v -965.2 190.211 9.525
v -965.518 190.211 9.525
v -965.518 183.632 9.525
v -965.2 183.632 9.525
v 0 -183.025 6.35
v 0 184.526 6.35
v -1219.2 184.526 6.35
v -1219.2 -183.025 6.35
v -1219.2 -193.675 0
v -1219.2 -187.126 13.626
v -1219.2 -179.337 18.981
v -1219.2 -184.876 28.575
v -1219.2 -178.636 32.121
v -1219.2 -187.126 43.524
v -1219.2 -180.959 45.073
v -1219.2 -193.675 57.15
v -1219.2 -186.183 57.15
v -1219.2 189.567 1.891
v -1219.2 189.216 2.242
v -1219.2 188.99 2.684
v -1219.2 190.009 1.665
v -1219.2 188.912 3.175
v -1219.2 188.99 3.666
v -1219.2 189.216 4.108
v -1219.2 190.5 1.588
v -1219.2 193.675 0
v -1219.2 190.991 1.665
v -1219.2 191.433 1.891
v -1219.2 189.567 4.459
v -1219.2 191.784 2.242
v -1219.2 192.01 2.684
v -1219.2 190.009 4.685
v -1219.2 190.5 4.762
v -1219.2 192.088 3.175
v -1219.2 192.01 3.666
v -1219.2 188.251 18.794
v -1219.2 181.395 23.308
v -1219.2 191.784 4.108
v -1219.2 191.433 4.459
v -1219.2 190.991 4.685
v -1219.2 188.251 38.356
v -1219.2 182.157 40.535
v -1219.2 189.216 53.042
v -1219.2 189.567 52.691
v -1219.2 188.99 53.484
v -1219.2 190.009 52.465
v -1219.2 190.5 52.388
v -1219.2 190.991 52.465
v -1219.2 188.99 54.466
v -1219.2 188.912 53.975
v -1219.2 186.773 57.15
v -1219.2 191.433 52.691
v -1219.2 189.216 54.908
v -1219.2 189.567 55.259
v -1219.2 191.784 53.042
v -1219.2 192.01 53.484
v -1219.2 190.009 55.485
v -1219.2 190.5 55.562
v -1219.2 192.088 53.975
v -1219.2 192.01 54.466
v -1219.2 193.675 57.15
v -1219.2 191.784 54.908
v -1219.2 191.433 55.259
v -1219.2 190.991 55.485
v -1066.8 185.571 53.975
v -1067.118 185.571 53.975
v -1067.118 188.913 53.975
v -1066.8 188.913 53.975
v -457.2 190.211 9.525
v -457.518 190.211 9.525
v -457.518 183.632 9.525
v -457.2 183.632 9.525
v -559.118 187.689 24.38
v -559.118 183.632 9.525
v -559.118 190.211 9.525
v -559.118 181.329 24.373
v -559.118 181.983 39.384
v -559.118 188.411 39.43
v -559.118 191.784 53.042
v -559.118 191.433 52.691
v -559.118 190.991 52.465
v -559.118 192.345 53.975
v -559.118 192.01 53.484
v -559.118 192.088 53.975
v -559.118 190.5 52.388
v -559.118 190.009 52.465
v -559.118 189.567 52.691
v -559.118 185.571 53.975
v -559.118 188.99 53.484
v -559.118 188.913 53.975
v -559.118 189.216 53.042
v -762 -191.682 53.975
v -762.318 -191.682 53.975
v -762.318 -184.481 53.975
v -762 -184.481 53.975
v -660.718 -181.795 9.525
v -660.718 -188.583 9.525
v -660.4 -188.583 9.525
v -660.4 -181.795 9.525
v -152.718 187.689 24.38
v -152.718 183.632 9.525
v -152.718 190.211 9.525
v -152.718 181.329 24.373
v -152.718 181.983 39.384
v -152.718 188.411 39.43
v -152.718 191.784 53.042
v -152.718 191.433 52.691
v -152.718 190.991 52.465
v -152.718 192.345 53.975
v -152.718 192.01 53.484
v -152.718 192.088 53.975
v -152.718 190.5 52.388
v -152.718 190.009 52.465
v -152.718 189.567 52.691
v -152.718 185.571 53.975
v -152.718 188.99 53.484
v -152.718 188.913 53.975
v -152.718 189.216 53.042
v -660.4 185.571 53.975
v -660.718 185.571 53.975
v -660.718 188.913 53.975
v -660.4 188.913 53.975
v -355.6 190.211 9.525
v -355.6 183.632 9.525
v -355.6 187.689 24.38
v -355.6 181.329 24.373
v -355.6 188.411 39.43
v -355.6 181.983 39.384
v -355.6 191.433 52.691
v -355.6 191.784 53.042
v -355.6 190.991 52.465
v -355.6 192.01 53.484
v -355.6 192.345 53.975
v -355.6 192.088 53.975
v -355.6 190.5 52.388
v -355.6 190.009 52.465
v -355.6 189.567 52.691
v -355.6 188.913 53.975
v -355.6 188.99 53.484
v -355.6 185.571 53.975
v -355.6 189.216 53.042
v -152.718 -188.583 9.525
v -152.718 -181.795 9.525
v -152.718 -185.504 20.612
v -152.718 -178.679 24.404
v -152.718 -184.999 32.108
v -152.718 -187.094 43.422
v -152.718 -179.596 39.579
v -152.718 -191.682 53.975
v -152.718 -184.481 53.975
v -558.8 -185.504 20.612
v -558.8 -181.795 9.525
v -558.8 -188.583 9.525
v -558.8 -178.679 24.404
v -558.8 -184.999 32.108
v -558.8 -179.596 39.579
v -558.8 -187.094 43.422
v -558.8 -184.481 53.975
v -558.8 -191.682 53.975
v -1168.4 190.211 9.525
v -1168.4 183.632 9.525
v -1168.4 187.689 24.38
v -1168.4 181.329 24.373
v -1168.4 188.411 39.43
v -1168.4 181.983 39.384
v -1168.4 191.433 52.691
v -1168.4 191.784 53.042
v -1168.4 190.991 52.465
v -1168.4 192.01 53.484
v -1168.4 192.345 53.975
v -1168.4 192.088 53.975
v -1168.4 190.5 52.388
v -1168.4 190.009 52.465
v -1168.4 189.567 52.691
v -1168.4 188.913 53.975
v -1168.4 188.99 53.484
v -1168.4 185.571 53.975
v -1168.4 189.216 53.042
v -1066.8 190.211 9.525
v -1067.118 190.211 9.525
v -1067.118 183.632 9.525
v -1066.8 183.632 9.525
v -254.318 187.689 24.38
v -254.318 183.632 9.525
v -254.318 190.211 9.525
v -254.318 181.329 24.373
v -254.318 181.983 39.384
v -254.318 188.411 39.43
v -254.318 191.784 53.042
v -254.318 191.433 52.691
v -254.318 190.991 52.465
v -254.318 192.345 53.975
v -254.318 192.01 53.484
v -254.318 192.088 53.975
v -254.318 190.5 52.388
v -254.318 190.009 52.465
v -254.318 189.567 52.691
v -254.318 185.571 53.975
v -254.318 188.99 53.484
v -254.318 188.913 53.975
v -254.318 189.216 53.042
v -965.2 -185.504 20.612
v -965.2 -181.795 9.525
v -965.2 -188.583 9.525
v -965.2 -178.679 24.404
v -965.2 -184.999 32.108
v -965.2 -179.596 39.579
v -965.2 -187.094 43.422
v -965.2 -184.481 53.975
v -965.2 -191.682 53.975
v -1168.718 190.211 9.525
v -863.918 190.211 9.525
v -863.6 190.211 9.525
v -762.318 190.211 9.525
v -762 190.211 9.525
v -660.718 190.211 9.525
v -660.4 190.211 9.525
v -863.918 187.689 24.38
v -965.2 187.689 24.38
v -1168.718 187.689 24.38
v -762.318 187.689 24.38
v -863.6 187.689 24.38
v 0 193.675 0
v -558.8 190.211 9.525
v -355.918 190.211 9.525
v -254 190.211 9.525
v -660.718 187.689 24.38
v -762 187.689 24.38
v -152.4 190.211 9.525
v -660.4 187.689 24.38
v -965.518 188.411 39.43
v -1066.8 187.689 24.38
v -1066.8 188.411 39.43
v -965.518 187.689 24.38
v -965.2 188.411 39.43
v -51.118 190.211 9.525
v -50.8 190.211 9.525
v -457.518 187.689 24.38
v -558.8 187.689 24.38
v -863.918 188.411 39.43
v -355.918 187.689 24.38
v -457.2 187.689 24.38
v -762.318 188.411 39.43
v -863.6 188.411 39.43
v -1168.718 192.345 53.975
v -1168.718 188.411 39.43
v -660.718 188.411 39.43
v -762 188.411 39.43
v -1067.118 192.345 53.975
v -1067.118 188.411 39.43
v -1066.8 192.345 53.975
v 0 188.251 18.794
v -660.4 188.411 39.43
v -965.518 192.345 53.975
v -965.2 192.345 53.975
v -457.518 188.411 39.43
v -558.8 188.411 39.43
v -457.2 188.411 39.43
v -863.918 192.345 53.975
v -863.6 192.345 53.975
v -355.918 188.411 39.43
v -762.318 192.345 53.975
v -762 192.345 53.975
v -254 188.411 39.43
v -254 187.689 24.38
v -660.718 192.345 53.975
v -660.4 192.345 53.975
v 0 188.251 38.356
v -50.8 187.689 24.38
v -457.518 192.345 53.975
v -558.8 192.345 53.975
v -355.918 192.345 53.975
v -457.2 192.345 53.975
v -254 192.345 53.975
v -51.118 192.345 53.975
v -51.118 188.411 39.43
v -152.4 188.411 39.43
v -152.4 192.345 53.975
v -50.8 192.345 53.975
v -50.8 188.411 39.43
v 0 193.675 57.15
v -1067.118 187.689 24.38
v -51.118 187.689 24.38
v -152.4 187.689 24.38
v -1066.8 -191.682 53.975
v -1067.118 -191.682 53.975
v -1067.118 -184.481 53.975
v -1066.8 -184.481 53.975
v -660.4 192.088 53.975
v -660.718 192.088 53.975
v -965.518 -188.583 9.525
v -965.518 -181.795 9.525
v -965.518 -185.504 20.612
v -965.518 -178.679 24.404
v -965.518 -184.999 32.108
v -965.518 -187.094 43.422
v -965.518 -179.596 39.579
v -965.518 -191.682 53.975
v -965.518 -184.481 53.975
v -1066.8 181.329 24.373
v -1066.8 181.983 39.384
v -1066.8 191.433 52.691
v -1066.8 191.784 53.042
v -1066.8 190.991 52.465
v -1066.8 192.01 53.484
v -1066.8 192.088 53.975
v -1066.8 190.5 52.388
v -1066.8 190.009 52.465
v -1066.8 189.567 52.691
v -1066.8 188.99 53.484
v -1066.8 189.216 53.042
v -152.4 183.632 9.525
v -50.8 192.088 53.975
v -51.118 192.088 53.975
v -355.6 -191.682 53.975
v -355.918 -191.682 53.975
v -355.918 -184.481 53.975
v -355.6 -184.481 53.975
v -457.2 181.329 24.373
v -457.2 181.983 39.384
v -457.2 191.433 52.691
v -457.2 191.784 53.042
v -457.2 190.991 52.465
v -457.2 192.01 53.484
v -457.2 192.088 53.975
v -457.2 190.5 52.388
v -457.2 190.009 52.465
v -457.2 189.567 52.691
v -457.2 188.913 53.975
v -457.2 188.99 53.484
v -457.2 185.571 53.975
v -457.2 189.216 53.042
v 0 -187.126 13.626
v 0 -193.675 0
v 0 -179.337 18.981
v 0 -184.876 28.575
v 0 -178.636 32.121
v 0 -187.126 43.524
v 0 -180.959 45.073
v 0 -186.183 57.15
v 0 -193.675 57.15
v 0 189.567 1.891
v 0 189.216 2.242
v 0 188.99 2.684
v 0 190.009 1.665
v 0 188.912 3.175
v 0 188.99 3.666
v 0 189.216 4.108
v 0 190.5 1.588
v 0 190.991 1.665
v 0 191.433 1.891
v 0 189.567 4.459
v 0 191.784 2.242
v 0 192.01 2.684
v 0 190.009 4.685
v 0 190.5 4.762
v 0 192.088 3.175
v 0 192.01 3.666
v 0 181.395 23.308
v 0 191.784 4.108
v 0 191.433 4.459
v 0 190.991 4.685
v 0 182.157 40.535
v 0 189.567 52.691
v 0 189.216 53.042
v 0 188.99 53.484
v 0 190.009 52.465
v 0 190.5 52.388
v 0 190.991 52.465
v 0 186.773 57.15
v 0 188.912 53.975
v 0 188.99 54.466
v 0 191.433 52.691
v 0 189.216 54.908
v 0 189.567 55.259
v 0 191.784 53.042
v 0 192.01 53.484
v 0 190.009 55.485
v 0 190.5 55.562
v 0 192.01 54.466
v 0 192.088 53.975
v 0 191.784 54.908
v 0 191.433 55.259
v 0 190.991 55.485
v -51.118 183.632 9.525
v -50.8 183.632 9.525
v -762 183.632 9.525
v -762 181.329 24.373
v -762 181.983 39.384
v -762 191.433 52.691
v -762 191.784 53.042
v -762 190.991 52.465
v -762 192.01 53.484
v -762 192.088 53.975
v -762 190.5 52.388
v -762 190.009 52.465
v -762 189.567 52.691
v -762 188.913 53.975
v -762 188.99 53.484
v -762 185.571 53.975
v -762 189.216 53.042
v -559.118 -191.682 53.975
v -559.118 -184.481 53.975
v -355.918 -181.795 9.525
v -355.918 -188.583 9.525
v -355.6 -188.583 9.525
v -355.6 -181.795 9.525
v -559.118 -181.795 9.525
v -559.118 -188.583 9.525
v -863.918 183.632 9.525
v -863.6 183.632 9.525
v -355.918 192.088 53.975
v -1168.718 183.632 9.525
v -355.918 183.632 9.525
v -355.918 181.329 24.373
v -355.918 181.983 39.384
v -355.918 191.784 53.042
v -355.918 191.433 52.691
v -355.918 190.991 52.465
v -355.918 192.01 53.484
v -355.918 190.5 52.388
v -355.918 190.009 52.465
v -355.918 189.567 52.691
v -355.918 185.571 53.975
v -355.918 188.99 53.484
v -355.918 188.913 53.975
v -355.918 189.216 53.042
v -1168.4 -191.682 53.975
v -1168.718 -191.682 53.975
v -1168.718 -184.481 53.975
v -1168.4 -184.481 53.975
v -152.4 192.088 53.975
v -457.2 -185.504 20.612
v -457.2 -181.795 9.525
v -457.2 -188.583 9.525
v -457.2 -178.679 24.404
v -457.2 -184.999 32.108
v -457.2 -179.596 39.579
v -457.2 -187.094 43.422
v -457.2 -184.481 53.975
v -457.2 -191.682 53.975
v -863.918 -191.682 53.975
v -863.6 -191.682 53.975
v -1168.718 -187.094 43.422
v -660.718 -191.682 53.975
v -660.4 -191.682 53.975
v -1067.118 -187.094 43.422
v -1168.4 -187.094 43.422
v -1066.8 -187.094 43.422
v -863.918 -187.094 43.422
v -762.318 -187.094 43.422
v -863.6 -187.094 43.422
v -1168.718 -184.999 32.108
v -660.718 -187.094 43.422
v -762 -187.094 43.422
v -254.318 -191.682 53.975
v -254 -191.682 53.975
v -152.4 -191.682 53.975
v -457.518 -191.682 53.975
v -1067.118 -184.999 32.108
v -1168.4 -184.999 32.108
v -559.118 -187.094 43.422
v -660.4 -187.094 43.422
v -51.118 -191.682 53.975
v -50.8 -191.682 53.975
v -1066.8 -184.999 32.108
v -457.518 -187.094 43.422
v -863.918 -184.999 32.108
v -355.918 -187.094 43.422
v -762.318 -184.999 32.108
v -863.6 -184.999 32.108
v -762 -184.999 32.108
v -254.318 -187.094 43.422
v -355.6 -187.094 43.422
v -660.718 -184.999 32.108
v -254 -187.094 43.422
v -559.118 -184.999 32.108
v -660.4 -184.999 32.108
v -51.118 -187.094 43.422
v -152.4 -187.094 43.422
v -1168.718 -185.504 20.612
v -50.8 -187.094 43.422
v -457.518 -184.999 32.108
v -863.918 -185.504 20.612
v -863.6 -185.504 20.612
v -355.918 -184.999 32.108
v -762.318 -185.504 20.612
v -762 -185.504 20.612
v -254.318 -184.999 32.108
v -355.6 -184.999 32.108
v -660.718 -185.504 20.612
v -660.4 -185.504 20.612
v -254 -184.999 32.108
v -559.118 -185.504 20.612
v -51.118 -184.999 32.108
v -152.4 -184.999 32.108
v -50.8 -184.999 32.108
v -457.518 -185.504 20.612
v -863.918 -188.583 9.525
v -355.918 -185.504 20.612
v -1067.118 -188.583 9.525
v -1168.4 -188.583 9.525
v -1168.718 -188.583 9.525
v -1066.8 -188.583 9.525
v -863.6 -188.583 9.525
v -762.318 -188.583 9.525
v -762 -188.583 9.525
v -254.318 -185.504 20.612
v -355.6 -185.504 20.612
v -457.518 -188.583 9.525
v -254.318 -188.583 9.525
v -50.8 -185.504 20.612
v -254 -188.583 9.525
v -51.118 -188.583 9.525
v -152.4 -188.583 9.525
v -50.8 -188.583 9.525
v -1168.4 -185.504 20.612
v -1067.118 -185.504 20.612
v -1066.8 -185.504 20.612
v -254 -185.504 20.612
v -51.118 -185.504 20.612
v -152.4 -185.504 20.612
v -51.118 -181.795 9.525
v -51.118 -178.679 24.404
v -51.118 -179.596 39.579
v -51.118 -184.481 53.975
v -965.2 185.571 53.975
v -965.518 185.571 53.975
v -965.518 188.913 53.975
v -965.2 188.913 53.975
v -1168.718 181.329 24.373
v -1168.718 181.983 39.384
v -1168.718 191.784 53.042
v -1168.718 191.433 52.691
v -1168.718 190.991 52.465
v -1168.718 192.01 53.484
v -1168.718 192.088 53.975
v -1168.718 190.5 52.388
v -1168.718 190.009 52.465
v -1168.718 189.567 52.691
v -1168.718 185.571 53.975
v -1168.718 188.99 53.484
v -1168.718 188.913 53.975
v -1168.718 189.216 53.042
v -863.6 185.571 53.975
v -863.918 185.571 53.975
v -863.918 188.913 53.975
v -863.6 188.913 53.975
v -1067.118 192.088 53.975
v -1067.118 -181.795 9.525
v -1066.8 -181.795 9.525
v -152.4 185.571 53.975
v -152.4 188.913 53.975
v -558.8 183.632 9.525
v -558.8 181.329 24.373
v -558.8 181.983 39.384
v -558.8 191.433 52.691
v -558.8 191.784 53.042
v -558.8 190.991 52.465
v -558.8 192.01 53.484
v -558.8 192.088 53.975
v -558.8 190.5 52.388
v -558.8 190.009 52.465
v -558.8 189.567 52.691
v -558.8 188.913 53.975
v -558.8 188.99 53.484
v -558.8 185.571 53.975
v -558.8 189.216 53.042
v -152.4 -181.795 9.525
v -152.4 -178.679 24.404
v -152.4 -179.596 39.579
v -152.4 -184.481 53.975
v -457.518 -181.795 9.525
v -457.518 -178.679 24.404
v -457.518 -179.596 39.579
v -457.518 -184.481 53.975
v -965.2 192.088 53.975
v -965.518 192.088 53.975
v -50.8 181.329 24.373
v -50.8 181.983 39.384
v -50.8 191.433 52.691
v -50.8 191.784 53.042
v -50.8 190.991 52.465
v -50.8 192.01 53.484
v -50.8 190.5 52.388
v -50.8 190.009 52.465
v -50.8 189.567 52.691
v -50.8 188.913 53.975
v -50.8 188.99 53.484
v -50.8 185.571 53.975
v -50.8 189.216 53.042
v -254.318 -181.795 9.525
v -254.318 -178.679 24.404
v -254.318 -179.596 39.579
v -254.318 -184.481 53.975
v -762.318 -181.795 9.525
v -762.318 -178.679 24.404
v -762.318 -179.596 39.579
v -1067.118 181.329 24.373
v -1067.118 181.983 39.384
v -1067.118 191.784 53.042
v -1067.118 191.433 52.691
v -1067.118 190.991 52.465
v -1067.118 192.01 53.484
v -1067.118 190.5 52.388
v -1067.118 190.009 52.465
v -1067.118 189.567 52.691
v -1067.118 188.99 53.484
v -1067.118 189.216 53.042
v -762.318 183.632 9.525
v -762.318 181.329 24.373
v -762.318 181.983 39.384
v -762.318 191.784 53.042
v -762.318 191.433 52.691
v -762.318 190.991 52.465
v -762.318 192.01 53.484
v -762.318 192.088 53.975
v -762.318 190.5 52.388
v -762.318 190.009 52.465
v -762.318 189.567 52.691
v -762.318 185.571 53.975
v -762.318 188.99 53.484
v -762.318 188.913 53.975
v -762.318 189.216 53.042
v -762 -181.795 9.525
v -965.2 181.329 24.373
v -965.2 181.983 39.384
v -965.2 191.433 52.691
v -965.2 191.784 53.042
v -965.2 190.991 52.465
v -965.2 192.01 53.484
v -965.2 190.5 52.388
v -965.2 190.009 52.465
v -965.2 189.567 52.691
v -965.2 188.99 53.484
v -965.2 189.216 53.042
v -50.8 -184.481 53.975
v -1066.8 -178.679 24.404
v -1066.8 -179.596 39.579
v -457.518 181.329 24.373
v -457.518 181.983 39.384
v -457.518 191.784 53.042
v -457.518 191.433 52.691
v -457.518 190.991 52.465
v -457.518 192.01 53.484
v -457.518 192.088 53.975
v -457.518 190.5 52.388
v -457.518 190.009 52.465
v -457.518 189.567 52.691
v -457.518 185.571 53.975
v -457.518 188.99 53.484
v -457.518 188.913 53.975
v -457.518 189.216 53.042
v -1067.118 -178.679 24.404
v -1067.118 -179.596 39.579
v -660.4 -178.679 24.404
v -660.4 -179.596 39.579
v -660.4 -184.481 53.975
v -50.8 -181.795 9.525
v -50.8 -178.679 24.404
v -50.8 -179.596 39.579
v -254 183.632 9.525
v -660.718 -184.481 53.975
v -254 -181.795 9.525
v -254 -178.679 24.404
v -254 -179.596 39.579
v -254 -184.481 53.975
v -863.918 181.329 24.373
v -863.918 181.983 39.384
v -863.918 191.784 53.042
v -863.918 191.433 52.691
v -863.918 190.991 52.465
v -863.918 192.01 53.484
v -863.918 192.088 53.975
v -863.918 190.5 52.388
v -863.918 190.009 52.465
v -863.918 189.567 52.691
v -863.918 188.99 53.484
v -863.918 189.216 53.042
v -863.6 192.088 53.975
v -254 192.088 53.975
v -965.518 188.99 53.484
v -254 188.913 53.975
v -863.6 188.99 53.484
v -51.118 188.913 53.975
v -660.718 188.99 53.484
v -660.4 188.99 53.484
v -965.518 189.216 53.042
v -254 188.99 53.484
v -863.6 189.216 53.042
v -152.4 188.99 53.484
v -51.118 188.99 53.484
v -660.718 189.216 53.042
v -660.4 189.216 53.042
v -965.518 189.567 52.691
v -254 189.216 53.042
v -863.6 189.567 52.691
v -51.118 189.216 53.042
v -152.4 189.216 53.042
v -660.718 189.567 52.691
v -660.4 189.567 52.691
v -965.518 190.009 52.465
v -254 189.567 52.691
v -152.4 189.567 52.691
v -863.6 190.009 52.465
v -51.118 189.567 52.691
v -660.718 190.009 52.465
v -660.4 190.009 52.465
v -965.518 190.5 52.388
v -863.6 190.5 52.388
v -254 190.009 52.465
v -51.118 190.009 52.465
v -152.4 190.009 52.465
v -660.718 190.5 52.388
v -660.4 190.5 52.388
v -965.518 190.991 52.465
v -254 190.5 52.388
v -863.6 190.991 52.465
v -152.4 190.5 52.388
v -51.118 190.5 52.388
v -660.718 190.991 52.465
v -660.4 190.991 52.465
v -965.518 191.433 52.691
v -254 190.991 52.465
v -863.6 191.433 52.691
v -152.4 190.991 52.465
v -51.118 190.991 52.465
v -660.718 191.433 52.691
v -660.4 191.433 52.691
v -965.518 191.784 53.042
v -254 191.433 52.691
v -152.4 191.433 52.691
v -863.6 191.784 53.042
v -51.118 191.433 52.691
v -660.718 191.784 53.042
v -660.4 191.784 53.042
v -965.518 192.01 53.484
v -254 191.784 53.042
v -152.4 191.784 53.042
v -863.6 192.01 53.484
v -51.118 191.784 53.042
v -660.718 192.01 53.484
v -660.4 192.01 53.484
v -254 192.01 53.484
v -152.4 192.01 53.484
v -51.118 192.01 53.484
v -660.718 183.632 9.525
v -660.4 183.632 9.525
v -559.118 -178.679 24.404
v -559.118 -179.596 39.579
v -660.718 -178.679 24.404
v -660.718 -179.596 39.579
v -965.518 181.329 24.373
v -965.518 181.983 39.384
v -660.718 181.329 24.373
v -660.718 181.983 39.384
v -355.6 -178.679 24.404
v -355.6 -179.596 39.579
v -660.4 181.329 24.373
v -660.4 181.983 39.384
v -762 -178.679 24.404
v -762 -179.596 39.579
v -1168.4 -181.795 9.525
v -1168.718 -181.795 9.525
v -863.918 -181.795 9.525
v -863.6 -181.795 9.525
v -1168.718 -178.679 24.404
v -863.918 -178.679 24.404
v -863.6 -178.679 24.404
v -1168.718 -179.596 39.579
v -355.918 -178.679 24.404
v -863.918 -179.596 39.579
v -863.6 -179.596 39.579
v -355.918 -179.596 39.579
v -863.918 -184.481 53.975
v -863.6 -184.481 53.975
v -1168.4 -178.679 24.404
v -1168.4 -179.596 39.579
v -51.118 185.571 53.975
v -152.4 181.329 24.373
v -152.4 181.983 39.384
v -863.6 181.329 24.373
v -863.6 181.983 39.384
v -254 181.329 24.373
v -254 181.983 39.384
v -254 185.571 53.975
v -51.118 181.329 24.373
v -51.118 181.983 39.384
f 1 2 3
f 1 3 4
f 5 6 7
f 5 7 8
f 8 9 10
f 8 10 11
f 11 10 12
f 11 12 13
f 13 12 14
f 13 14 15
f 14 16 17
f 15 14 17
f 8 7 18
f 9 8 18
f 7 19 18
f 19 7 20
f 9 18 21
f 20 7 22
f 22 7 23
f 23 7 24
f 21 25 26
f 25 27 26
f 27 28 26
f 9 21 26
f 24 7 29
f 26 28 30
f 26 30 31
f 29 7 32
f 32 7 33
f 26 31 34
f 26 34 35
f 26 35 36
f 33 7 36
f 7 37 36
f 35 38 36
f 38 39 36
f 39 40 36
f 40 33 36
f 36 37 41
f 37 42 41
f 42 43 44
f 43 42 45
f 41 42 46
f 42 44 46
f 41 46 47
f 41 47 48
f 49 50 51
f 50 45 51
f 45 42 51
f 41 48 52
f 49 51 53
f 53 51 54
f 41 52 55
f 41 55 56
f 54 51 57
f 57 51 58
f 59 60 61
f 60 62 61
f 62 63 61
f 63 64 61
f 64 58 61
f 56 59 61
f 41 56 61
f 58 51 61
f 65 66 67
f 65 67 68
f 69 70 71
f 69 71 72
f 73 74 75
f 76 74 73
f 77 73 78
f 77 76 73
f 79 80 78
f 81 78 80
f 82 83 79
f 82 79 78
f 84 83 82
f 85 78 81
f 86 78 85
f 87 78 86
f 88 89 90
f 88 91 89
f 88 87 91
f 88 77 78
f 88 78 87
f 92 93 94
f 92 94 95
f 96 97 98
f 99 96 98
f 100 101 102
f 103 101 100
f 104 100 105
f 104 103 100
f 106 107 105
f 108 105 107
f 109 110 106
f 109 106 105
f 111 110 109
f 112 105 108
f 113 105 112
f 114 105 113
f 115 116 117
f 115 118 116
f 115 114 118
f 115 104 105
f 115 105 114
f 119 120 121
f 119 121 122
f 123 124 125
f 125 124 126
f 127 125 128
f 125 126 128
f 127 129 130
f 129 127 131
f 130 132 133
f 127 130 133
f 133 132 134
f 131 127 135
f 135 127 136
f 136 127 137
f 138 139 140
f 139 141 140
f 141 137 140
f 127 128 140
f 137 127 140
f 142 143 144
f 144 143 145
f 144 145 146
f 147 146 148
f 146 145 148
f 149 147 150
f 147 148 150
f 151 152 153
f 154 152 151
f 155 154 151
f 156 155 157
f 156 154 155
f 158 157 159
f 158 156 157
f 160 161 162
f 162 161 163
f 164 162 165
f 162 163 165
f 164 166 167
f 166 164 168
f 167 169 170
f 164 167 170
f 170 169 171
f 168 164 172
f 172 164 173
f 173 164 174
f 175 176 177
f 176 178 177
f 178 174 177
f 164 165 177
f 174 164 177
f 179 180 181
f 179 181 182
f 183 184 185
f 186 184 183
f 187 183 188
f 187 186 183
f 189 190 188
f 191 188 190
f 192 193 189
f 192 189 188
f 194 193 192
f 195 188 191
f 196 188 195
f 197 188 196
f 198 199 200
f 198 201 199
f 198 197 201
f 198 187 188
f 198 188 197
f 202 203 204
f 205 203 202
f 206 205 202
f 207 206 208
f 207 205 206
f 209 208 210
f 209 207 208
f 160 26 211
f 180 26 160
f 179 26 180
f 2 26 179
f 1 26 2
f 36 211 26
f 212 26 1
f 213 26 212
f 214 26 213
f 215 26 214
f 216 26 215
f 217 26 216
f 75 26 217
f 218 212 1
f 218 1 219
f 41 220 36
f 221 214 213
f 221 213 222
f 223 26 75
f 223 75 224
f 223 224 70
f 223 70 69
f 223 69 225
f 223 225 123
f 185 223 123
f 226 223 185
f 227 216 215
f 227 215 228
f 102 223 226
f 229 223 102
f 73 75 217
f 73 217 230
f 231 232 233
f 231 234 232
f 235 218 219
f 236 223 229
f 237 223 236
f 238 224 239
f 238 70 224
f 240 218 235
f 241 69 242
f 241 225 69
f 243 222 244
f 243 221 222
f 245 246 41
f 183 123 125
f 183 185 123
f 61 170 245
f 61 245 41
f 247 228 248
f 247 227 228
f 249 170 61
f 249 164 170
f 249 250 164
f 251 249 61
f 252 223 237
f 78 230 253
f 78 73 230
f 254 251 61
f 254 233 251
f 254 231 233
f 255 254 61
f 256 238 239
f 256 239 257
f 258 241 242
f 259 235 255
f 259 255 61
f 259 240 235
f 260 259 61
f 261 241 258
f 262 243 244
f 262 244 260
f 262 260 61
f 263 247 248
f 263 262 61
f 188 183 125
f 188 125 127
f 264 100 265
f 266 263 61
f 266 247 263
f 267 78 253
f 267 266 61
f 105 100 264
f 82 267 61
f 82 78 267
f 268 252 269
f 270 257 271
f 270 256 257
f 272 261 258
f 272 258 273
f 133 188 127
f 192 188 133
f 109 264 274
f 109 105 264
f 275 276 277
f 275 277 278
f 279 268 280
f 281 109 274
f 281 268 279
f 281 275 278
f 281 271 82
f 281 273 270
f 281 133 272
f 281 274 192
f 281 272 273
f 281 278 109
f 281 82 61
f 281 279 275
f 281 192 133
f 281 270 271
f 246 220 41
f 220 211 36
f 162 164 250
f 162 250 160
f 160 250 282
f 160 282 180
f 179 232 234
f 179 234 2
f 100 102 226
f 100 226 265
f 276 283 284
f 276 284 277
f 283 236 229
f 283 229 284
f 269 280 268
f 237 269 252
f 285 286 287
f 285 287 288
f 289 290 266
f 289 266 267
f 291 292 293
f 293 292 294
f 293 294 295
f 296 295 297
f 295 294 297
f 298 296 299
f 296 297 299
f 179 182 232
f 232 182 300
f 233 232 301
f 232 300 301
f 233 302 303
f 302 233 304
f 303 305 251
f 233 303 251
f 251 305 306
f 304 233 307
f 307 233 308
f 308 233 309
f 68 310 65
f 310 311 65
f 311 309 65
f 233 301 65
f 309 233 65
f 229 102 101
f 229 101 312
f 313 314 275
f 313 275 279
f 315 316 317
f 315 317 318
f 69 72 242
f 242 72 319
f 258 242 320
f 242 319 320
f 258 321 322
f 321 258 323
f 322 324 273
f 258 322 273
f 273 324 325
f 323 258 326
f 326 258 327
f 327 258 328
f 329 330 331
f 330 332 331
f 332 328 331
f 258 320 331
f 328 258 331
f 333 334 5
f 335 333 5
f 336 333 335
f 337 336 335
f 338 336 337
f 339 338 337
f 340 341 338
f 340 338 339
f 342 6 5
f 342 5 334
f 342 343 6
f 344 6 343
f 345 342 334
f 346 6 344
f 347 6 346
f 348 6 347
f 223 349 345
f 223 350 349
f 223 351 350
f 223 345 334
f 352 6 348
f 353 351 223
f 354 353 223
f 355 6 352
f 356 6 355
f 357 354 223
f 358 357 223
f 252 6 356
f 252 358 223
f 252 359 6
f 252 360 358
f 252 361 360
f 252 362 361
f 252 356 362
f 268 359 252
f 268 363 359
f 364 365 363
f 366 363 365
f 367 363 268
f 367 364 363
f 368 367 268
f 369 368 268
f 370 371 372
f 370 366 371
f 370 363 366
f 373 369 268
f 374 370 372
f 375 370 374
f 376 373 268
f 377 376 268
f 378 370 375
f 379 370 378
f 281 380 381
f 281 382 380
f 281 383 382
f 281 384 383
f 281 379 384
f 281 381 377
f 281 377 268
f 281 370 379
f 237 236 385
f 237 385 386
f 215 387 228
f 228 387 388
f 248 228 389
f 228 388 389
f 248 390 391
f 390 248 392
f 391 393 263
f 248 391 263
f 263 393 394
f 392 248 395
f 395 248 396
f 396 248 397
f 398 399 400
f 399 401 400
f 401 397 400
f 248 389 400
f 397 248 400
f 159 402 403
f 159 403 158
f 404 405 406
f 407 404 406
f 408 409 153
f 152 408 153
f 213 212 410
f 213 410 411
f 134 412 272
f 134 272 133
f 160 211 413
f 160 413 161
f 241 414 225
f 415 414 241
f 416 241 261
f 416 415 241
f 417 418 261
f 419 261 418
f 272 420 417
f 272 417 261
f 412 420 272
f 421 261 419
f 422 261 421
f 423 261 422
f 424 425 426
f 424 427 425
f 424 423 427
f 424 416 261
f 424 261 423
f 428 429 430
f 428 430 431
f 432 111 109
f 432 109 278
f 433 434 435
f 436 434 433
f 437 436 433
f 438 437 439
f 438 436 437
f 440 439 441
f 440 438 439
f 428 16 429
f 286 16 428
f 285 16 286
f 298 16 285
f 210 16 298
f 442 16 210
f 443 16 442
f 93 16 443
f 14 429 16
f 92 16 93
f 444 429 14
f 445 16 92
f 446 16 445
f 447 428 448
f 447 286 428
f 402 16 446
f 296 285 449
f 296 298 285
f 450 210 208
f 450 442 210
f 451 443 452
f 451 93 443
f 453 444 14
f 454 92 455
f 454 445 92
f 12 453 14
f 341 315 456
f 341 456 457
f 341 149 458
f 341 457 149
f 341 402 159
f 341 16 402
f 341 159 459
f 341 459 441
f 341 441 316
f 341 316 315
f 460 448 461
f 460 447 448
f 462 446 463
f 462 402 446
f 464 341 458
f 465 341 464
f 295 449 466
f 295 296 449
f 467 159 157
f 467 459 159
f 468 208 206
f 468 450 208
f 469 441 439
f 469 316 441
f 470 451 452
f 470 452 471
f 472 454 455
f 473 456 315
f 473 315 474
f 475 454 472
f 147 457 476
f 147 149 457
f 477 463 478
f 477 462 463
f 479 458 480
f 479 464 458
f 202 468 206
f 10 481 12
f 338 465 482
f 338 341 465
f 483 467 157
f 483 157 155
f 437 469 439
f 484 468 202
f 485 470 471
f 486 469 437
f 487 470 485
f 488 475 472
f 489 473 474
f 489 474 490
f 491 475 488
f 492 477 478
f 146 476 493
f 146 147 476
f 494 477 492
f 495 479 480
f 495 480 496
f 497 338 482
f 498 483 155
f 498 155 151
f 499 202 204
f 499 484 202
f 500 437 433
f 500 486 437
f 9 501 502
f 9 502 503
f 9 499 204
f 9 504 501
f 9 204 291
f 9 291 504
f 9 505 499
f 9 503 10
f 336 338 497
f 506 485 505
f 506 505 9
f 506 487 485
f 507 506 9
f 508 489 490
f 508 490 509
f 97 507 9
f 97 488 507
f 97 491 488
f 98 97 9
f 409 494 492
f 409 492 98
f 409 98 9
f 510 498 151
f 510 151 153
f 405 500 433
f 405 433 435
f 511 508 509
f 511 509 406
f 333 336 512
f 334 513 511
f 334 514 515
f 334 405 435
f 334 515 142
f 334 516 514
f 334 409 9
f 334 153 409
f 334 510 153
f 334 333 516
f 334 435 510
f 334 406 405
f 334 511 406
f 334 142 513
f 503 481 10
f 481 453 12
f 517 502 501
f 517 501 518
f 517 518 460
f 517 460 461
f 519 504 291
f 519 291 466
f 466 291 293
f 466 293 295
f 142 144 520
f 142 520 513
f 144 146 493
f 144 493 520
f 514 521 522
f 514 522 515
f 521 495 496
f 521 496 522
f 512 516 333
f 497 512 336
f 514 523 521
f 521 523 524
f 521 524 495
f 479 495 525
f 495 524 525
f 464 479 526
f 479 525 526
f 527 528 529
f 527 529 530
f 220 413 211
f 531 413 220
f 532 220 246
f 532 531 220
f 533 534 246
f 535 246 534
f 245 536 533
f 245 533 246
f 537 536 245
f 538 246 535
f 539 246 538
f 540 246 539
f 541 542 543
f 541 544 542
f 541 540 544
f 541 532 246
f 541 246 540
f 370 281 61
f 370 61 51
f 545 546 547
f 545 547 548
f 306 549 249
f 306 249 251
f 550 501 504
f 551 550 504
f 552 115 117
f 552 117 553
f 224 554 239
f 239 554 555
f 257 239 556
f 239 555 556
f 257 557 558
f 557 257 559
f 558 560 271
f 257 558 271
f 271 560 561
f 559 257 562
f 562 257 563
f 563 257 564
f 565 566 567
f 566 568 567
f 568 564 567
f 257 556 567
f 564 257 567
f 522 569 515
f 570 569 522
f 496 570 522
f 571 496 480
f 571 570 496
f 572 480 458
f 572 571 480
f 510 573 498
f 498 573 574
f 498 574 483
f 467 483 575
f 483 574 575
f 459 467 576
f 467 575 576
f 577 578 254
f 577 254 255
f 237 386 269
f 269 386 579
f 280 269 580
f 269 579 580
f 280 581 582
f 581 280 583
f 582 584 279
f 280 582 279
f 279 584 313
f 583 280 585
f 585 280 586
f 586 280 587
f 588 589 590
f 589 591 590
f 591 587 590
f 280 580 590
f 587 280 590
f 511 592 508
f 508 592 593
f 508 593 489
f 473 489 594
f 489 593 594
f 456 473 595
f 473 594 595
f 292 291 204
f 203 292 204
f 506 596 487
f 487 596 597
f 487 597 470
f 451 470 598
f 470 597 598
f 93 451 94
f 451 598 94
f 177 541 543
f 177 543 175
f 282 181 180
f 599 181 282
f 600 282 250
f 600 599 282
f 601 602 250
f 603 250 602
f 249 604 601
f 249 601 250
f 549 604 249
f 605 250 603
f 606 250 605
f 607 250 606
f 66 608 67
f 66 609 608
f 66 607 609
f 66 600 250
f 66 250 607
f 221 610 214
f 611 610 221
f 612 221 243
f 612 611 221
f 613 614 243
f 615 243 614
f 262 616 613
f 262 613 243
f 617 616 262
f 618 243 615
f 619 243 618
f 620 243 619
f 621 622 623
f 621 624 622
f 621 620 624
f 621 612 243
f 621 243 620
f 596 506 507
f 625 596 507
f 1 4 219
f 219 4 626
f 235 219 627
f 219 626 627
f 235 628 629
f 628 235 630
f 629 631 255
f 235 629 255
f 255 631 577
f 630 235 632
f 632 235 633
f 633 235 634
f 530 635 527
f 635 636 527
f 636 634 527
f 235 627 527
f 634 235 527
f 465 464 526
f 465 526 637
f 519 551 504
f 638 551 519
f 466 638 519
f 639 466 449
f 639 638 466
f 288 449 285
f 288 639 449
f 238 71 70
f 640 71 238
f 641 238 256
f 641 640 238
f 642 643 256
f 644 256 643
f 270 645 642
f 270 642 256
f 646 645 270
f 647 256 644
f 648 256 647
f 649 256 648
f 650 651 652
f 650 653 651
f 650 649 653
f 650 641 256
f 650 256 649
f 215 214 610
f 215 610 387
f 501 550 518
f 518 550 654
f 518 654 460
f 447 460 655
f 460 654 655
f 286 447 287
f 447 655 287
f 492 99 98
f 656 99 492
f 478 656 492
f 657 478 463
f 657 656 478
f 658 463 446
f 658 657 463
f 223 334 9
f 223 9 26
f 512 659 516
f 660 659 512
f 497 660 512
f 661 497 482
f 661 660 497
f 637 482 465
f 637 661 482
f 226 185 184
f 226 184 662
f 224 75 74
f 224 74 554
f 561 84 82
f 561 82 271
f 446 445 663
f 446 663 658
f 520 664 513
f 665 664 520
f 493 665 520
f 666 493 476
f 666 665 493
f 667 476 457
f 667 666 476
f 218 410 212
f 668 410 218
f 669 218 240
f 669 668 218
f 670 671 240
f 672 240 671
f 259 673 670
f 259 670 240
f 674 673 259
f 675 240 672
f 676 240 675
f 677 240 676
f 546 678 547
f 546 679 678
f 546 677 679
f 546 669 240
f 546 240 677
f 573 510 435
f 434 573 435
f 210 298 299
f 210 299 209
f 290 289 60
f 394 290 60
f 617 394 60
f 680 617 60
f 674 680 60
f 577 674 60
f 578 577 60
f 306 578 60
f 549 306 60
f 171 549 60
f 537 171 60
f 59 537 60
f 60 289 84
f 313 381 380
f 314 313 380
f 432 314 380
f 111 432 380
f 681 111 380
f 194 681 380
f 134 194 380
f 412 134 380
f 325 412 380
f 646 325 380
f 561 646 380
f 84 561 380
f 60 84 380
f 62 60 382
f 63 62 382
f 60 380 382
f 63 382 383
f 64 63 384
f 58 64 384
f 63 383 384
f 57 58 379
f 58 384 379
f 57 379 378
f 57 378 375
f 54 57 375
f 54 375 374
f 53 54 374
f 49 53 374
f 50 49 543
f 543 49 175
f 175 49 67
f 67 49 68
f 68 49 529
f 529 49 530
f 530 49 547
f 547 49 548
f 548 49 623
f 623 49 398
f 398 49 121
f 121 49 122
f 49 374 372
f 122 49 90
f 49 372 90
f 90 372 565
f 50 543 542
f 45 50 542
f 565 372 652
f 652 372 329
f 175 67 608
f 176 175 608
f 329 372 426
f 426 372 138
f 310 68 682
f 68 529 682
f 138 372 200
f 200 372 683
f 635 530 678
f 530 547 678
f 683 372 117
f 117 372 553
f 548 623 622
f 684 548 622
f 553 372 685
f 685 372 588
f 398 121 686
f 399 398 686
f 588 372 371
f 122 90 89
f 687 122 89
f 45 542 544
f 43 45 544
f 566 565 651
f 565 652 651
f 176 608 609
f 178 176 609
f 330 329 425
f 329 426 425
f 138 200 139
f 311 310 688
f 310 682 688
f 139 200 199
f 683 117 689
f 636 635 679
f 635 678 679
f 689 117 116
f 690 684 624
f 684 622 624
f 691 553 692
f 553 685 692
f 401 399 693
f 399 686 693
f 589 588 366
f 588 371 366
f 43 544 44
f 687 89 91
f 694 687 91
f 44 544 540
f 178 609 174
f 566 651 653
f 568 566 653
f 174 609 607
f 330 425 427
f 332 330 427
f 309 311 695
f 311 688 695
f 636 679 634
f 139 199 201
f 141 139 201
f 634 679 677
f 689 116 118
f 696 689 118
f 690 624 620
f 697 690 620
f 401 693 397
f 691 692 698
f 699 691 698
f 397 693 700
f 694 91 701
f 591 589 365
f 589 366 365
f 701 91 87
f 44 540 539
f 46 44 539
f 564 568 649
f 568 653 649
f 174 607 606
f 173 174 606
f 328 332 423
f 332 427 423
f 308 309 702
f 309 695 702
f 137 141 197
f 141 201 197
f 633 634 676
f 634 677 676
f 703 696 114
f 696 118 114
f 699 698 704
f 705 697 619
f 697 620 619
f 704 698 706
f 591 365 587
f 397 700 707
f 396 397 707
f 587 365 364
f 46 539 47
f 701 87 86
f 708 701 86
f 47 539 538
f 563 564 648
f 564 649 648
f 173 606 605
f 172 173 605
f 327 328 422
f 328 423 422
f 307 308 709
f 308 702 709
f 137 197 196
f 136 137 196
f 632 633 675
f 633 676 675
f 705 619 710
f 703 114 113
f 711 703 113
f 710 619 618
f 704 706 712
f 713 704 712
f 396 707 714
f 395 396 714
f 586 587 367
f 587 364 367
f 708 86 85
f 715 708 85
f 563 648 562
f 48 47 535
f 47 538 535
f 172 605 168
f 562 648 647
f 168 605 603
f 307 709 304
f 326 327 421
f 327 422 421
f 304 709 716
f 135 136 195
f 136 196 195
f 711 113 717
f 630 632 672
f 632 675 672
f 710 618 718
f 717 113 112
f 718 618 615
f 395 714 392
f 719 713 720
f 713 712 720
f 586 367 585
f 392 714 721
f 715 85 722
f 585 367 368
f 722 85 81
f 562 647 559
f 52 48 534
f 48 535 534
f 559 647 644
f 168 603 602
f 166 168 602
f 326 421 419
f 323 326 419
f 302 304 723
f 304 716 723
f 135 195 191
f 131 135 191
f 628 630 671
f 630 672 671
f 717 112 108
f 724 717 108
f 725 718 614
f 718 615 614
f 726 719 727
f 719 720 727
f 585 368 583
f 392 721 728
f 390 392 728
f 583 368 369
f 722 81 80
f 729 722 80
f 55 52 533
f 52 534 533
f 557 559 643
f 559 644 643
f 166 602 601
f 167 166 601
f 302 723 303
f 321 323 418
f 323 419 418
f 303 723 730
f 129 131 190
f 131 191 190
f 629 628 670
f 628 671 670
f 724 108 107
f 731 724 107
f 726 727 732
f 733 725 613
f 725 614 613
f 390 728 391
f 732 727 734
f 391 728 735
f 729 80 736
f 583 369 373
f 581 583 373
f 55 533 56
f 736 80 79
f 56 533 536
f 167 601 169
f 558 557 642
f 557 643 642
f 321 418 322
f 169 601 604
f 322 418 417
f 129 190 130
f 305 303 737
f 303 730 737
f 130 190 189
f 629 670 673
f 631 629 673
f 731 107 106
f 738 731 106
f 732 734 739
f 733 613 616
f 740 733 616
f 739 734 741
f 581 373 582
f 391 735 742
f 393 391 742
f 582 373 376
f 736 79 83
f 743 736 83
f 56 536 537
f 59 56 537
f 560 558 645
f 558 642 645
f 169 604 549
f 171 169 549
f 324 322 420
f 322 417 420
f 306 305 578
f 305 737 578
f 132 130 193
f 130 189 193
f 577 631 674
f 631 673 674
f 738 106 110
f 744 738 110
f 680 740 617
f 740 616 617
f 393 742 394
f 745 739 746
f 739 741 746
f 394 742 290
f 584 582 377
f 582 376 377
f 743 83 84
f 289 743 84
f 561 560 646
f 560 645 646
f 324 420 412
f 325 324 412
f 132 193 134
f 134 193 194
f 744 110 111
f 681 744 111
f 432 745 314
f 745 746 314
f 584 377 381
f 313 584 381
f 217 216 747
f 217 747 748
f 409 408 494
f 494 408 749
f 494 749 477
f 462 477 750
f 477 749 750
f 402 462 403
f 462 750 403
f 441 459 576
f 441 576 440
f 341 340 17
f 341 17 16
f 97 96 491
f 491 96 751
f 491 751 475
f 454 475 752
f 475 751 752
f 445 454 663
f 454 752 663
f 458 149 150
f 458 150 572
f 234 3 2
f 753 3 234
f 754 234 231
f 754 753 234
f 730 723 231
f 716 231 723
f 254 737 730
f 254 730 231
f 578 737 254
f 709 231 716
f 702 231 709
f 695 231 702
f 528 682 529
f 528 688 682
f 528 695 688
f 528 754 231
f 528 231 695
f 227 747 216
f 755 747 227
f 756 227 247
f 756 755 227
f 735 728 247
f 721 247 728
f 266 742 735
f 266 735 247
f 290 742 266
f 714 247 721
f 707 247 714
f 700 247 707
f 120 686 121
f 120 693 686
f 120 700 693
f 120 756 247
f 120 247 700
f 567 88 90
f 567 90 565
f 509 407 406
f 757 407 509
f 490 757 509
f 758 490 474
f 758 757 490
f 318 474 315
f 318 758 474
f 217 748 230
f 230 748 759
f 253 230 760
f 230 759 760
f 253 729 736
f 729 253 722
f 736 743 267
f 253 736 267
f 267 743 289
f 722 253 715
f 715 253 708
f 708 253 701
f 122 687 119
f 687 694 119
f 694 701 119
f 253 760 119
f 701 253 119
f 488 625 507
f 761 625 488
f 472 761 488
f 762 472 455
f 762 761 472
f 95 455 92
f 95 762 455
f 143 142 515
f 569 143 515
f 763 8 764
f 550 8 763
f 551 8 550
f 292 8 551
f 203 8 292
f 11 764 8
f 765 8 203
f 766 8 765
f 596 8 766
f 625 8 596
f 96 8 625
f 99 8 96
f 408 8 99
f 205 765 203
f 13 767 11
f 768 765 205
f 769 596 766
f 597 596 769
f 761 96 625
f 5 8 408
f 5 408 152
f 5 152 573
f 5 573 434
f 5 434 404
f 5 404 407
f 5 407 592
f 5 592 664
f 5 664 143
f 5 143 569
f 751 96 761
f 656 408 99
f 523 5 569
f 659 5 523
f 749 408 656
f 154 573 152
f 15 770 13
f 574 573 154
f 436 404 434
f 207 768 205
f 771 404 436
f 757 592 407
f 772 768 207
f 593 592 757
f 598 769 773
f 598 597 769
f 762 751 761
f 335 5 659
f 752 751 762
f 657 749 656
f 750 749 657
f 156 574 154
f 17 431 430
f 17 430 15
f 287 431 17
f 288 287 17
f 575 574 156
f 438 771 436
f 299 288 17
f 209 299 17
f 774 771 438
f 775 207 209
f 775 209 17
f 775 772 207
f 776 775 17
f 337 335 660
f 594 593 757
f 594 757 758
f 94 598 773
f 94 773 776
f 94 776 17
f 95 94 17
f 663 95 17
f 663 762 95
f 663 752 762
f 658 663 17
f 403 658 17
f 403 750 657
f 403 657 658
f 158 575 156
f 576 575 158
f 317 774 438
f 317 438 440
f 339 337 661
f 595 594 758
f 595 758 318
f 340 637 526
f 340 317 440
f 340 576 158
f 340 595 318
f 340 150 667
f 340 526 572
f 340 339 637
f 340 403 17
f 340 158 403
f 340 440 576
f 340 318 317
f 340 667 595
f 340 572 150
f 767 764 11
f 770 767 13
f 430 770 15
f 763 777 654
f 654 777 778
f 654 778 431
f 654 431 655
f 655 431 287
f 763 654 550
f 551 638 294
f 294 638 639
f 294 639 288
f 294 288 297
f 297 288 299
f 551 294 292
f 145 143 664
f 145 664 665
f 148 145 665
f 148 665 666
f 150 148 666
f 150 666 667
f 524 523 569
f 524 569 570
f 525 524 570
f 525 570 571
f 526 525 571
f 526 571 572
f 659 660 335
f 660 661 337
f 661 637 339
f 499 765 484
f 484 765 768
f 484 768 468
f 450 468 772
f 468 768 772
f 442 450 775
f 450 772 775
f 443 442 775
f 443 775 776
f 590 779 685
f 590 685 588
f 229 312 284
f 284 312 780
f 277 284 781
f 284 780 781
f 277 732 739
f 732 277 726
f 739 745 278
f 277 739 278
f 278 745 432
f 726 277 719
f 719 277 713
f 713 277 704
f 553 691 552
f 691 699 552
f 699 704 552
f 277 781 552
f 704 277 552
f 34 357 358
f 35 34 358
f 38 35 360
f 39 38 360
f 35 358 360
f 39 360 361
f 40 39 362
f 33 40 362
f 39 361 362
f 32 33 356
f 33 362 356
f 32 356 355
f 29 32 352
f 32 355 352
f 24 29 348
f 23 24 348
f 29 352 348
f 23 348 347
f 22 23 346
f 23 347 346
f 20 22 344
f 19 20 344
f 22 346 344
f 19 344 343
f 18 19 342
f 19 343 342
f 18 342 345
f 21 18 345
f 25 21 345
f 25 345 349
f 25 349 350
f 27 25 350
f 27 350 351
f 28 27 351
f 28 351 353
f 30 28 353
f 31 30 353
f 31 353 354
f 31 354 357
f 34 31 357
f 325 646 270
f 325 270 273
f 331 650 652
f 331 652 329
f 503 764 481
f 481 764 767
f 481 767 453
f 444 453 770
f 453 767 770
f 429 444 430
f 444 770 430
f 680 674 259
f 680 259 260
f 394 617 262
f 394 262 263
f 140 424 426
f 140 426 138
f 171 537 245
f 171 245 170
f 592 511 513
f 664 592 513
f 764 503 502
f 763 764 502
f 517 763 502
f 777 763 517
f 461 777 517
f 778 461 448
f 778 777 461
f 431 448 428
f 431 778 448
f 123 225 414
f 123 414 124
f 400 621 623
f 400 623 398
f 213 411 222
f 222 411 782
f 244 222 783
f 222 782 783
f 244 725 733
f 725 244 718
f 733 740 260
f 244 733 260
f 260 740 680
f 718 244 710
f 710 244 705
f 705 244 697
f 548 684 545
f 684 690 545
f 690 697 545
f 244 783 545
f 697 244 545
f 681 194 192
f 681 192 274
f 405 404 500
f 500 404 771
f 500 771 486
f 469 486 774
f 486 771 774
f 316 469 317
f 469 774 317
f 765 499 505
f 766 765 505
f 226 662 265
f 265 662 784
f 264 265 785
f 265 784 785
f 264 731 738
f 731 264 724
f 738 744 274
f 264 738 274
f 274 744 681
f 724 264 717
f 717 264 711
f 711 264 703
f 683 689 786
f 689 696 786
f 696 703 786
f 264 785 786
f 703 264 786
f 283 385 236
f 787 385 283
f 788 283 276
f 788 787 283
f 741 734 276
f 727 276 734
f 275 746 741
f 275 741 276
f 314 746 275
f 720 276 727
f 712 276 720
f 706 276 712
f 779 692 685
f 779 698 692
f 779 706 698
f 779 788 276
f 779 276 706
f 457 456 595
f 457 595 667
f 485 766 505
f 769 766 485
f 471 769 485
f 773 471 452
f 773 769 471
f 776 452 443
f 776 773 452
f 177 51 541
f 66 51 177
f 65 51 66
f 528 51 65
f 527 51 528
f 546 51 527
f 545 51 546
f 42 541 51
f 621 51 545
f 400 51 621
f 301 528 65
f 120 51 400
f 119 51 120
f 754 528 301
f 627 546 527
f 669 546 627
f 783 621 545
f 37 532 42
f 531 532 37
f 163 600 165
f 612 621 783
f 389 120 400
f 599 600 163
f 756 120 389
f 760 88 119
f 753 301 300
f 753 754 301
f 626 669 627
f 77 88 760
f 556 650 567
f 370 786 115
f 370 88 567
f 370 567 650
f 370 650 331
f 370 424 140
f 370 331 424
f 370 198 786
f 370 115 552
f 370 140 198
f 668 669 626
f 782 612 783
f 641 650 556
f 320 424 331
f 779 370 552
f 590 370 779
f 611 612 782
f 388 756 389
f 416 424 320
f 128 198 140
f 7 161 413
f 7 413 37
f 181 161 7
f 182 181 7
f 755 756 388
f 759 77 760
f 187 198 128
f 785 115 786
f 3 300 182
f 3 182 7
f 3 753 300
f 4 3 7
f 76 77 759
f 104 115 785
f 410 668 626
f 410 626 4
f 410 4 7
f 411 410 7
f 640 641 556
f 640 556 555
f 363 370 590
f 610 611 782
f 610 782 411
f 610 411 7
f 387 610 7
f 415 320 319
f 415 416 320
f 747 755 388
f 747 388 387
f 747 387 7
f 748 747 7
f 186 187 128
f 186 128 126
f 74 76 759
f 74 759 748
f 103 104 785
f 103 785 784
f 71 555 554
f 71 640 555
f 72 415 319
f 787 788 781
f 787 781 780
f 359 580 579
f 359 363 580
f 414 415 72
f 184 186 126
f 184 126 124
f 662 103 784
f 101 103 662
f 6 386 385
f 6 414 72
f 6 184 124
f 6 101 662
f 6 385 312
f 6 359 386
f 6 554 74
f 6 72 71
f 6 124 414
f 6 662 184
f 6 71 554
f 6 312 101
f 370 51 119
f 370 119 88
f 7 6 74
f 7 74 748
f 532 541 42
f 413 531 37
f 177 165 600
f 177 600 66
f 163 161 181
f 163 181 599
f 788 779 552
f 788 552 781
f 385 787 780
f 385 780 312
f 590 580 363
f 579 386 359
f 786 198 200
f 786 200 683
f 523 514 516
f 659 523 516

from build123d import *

# Parameters (mm, degrees)
F1_DEPTH      = 1219.2
F2_R          = 1.5875
F3_DEPTH      = 1219.201
F4_W          = 0.3175
F4_H          = 44.45
F5_DEPTH      = 193.3445428183
F5_DEPTH_BACK = 192.6822115509


with BuildPart() as f1:
    # F0 (on Right) → F1 (new body)
    with BuildSketch(Plane.YZ):
        with BuildLine():
            ThreePointArc((-193.675, 57.15), (-184.8763020632, 28.575), (-193.675, 0))
            Line((-193.675, 0), (193.675, 0))
            ThreePointArc((193.675, 0), (187.5626801821, 28.575), (193.675, 57.15))
            Line((193.675, 57.15), (186.7733895925, 57.15))
            ThreePointArc((186.7733895925, 57.15), (181.2871488449, 31.94300811), (184.5258543835, 6.35))
            Line((184.5258543835, 6.35), (-183.0248835163, 6.35))
            ThreePointArc((-183.0248835163, 6.35), (-178.6364166438, 32.1209796041), (-186.1829502369, 57.15))
            Line((-186.1829502369, 57.15), (-193.675, 57.15))
        make_face()
    extrude(amount=-F1_DEPTH)

    # F2 (on face) → F3 (cut, through all)
    with BuildSketch(Plane.YZ):
        with Locations((190.5, 53.975)):
            Circle(F2_R)
        with Locations((190.5, 3.175)):
            Circle(F2_R)
    extrude(amount=-F3_DEPTH, mode=Mode.SUBTRACT)

    # F4 (on Front) → F5 (cut, two sides)
    with BuildSketch(Plane.XZ) as f5_sk:
        with Locations((-50.95875, 31.75)):
            Rectangle(F4_W, F4_H)
        with Locations((-152.55875, 31.75)):
            Rectangle(F4_W, F4_H)
        with Locations((-254.15875, 31.75)):
            Rectangle(F4_W, F4_H)
        with Locations((-355.75875, 31.75)):
            Rectangle(F4_W, F4_H)
        with Locations((-457.35875, 31.75)):
            Rectangle(F4_W, F4_H)
        with Locations((-558.95875, 31.75)):
            Rectangle(F4_W, F4_H)
        with Locations((-660.55875, 31.75)):
            Rectangle(F4_W, F4_H)
        with Locations((-762.15875, 31.75)):
            Rectangle(F4_W, F4_H)
        with Locations((-863.75875, 31.75)):
            Rectangle(F4_W, F4_H)
        with Locations((-965.35875, 31.75)):
            Rectangle(F4_W, F4_H)
        with Locations((-1066.95875, 31.75)):
            Rectangle(F4_W, F4_H)
        with Locations((-1168.55875, 31.75)):
            Rectangle(F4_W, F4_H)
    extrude(amount=-F5_DEPTH, mode=Mode.SUBTRACT)
    extrude(f5_sk.sketch, amount=F5_DEPTH_BACK, mode=Mode.SUBTRACT)


solid = f1.part
